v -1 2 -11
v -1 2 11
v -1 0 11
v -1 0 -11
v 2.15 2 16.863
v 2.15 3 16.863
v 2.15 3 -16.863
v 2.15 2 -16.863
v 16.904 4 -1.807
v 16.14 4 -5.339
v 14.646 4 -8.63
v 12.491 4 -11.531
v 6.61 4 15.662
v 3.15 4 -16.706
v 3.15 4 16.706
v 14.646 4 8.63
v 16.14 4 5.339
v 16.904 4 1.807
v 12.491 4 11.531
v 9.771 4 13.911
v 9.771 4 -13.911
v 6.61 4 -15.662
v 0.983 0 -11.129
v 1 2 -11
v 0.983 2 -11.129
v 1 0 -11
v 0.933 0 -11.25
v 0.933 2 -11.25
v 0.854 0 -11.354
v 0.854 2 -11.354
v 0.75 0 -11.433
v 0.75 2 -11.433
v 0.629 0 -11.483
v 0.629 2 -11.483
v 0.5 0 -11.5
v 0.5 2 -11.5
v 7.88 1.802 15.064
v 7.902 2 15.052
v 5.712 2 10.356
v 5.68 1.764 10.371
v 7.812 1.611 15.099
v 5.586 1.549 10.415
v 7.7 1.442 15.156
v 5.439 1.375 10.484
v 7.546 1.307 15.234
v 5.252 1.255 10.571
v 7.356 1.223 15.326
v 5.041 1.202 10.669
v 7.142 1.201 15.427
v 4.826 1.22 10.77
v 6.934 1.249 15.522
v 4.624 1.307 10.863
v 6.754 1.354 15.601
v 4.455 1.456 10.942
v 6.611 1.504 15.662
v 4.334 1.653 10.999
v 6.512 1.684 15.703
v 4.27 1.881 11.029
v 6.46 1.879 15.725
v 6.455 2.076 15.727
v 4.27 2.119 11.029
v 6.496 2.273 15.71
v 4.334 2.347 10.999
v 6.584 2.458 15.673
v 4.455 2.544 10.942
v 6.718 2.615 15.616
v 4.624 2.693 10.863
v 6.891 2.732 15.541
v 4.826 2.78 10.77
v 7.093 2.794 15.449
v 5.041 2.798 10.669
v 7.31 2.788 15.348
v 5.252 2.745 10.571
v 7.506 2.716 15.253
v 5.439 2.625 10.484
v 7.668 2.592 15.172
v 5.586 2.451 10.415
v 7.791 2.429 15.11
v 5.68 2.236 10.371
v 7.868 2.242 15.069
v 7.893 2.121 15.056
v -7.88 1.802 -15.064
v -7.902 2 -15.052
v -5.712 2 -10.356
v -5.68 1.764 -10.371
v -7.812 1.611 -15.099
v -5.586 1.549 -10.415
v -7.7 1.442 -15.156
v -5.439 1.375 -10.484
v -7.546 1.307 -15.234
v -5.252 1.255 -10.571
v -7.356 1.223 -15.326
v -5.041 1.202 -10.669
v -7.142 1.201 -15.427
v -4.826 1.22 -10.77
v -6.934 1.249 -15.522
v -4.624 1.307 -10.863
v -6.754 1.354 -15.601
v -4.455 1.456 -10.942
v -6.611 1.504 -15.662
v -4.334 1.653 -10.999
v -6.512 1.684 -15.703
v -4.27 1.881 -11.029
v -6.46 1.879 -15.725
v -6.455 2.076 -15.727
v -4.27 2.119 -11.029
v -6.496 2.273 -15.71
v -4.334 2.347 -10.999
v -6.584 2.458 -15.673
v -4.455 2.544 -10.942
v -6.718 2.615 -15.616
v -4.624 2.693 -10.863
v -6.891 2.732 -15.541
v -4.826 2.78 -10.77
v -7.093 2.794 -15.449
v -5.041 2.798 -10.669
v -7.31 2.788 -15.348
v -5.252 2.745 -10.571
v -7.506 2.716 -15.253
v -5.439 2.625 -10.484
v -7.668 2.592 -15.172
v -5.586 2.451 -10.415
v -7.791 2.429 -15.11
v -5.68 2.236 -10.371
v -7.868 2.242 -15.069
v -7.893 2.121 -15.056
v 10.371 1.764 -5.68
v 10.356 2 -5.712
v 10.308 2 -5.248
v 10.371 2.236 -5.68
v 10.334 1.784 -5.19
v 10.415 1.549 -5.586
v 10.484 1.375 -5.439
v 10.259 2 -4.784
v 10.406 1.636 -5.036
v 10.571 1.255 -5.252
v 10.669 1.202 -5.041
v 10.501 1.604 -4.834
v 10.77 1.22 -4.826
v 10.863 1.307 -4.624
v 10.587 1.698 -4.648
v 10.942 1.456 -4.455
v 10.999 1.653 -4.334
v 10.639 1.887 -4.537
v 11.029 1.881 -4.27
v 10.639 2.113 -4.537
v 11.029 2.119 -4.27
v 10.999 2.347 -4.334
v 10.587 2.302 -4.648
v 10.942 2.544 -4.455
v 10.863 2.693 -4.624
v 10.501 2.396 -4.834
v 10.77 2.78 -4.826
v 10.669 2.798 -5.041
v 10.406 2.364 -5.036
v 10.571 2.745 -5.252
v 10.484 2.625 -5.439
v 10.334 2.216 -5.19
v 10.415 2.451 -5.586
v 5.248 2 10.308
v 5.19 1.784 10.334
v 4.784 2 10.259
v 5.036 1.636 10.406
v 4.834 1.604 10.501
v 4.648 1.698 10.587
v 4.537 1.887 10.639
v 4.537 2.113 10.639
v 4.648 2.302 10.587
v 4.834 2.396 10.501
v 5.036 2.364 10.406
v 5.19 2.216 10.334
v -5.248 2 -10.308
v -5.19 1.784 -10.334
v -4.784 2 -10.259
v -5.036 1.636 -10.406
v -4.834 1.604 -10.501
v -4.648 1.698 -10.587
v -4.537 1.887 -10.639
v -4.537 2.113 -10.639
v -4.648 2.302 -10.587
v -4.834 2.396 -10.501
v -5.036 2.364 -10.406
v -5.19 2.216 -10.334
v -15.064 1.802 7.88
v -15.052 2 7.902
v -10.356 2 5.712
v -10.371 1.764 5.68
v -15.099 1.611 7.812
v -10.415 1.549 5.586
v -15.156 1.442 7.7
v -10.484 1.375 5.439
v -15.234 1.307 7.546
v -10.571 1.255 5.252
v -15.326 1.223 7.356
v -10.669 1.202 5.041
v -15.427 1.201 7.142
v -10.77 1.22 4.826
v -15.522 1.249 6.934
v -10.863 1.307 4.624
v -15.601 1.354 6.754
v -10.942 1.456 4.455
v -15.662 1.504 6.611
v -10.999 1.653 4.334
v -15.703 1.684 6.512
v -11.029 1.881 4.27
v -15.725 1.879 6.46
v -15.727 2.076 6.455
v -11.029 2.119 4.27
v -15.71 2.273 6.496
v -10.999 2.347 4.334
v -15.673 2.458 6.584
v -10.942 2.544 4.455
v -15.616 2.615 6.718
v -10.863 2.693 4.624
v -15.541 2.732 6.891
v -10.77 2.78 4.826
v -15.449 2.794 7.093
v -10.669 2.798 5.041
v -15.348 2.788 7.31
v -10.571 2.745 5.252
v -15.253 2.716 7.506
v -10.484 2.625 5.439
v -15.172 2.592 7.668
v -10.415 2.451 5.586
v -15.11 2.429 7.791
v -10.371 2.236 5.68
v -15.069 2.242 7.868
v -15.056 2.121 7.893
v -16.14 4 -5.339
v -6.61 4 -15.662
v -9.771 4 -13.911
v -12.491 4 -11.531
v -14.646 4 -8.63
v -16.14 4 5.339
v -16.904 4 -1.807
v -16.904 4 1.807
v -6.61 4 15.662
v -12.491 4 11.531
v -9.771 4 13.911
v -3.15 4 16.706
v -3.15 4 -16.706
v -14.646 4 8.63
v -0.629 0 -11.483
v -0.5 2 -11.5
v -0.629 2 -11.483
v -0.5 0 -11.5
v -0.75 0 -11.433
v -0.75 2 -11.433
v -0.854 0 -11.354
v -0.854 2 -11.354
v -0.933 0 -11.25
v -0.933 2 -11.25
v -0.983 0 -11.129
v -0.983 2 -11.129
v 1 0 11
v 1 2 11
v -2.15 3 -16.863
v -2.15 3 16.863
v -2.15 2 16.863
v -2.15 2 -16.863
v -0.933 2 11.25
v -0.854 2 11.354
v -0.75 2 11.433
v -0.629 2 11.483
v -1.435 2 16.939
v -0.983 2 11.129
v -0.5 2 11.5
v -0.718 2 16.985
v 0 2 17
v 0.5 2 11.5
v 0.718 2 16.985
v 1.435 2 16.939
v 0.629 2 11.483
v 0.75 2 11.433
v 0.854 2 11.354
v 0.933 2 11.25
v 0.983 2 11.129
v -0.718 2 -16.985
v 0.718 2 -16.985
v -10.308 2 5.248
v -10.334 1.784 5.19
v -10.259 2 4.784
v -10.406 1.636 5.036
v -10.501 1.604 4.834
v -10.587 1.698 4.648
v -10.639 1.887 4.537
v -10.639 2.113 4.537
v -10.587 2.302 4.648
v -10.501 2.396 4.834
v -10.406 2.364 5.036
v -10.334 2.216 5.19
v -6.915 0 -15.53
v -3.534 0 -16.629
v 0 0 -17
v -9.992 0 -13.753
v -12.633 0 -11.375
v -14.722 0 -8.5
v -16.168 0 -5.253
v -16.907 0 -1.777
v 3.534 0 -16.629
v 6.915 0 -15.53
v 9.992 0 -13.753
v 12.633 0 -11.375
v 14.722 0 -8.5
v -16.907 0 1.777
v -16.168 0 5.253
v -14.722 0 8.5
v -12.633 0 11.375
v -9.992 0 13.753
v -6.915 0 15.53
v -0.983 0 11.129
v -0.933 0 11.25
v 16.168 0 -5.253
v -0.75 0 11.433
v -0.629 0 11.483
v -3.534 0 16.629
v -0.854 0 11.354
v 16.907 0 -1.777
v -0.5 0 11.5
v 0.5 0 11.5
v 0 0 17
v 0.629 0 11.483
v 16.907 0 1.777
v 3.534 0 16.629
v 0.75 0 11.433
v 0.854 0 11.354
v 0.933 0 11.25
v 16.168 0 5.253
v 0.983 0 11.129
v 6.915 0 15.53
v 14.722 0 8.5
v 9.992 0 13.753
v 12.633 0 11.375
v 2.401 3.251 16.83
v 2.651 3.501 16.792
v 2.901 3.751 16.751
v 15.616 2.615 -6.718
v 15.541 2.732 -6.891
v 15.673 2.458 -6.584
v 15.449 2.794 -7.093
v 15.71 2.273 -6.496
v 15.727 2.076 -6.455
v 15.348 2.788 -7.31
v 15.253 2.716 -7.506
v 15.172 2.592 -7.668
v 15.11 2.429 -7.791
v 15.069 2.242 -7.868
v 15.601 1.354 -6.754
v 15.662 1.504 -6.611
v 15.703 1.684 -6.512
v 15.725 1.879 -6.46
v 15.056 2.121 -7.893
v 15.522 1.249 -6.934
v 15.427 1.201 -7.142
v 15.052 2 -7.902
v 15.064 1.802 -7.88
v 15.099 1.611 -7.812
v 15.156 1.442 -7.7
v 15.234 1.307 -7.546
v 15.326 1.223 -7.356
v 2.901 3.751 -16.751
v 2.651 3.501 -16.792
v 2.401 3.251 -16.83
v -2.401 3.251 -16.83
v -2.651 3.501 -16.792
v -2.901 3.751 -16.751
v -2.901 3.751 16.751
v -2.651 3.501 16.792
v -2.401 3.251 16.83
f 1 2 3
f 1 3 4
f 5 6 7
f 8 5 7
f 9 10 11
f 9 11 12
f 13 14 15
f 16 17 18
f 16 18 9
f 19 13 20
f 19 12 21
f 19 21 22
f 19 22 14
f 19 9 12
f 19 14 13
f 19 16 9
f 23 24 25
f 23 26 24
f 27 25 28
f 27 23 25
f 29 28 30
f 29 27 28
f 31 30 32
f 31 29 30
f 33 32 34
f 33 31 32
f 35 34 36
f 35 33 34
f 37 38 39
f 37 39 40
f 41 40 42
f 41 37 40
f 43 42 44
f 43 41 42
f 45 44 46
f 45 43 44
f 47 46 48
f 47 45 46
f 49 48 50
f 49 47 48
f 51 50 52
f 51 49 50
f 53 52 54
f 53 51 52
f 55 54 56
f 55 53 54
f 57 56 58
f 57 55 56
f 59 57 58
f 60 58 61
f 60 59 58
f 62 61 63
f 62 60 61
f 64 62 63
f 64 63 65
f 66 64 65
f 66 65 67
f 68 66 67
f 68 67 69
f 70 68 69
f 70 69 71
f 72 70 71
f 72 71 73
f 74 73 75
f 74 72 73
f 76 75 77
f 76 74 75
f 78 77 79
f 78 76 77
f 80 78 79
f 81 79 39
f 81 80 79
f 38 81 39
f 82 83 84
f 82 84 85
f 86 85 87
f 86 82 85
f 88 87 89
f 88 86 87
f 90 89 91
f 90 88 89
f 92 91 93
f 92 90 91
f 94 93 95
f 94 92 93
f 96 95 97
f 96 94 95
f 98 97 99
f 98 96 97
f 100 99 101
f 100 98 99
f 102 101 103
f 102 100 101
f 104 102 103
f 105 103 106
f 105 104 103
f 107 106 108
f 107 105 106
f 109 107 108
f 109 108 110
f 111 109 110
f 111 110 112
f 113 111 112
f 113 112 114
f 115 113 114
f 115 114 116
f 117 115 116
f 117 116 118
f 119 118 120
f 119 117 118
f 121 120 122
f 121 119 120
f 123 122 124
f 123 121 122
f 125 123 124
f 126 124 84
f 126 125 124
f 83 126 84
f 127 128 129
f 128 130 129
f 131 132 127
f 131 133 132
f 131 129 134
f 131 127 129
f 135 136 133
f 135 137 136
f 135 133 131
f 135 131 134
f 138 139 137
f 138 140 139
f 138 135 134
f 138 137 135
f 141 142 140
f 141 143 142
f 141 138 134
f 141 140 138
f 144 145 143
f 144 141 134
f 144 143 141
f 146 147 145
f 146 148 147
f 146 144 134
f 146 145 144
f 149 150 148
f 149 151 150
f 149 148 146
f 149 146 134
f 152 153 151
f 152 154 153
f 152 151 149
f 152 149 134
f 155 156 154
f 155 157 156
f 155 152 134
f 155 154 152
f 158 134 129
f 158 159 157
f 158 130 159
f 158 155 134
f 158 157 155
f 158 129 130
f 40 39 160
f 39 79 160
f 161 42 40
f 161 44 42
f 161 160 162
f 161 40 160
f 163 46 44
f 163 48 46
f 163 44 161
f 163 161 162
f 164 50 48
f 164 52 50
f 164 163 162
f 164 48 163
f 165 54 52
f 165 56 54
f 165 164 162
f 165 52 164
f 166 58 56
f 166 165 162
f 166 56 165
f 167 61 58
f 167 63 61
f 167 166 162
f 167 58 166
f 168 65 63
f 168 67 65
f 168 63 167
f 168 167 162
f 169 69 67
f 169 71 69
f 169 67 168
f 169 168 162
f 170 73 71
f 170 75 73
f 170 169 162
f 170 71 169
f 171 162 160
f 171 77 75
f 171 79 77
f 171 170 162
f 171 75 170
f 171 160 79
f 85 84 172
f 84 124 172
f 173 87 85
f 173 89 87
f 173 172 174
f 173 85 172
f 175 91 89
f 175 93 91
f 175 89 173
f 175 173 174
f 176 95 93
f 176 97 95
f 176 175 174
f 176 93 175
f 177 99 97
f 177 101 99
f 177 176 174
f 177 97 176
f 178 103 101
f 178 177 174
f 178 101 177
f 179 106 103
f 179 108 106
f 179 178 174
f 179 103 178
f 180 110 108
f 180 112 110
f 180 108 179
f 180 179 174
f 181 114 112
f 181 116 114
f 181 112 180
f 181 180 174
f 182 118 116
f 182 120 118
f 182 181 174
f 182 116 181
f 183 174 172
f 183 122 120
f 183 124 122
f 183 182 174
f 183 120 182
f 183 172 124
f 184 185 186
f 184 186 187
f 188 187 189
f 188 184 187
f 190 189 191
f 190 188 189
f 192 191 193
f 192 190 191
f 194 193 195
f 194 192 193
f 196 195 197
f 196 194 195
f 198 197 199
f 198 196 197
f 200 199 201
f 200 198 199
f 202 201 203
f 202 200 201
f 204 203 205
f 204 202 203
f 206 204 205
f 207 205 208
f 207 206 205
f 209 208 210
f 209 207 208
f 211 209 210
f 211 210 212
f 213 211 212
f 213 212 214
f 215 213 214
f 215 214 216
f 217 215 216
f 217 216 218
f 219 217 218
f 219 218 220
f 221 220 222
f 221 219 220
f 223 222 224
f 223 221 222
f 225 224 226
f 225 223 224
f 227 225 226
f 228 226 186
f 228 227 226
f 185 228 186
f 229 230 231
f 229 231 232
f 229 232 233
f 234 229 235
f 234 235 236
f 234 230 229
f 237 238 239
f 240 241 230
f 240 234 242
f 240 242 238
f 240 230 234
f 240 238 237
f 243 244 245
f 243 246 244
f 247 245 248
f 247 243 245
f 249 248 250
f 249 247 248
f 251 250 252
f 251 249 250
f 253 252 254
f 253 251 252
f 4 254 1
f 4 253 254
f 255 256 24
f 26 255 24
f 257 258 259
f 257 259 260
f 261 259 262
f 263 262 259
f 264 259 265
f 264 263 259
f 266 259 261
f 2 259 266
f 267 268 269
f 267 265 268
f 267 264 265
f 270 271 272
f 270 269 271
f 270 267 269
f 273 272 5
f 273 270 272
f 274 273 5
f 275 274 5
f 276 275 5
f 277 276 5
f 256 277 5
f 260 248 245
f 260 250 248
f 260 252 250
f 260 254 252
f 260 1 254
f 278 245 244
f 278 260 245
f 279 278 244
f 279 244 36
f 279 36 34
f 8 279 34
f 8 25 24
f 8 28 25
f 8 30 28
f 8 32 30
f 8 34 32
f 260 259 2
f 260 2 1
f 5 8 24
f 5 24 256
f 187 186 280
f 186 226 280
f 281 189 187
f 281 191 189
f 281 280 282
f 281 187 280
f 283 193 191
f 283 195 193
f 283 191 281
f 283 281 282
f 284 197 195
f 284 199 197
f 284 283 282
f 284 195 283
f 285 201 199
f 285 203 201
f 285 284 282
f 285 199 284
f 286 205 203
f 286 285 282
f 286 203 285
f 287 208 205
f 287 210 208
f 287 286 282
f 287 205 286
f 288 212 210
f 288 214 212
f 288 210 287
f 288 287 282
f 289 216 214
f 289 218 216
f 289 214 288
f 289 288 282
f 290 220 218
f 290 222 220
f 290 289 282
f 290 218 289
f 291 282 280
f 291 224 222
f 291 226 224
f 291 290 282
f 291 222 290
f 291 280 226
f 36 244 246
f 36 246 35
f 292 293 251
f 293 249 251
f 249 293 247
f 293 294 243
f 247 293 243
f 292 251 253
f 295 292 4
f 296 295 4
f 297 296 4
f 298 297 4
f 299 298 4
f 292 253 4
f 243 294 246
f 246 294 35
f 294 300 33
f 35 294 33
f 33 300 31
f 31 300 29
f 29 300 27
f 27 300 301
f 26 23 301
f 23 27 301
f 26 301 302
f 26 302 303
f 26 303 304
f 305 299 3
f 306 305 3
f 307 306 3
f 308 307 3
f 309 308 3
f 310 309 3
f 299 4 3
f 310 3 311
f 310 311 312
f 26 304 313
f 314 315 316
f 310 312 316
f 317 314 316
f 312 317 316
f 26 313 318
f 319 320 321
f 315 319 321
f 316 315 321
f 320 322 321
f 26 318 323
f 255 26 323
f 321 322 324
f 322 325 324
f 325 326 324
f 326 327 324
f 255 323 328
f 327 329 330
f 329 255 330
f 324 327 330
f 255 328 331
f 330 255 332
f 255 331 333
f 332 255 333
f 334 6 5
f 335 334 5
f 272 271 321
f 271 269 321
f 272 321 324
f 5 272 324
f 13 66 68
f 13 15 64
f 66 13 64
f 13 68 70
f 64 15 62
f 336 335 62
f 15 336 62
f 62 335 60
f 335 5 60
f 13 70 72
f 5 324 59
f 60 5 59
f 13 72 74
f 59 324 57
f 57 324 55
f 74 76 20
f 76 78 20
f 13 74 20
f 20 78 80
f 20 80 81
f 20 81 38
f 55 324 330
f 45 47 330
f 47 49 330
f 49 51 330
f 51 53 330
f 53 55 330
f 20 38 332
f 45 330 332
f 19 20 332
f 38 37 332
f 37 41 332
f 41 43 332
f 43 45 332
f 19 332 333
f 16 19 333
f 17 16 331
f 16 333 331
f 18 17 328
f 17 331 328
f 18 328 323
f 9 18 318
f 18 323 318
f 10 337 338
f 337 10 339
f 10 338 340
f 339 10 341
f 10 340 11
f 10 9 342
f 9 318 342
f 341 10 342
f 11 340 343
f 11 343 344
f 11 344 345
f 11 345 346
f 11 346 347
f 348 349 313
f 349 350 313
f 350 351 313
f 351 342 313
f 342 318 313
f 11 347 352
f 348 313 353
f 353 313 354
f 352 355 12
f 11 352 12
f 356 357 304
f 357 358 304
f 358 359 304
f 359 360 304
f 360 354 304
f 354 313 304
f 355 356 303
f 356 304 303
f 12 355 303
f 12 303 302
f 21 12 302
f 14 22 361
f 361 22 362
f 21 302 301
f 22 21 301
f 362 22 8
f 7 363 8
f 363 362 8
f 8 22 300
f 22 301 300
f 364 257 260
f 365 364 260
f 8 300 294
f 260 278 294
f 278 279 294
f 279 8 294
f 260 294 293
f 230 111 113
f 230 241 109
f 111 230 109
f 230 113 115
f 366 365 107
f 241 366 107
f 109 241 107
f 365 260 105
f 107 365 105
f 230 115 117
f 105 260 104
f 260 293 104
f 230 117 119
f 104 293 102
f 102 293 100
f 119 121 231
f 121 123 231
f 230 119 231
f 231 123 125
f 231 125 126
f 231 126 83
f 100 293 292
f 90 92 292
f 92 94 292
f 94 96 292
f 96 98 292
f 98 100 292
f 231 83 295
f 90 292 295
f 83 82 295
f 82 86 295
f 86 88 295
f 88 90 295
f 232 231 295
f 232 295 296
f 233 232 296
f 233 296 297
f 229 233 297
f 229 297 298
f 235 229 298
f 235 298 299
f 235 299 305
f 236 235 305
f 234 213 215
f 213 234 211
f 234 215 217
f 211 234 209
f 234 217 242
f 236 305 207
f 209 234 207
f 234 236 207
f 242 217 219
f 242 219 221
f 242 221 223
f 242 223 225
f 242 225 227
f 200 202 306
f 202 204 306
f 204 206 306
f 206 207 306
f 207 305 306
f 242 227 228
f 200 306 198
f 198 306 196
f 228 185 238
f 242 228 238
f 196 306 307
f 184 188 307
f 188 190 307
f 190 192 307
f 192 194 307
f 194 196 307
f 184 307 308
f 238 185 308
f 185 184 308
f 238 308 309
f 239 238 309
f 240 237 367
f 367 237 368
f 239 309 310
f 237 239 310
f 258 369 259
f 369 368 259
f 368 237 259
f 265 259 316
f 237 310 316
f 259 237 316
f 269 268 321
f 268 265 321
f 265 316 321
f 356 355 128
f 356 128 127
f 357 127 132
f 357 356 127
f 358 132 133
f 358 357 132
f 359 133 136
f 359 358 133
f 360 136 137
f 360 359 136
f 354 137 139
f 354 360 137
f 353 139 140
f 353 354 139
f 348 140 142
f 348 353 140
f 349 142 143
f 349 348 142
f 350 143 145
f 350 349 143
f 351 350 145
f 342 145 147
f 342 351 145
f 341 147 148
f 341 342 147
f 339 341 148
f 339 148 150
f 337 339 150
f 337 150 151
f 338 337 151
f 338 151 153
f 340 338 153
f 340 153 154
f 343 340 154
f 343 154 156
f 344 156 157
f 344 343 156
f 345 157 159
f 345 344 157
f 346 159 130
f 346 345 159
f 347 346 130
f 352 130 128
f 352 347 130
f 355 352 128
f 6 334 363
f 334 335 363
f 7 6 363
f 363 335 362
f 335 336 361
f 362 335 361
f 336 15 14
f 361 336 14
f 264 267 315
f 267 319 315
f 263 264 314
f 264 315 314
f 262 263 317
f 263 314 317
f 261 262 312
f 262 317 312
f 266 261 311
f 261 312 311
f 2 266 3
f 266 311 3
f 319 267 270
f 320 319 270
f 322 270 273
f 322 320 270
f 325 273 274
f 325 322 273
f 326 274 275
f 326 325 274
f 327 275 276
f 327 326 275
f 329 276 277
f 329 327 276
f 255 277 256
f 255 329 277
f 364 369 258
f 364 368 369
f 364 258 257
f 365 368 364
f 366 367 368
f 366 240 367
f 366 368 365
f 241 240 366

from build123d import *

# Parameters (mm, degrees)
SKETCH1_R           = 17
BOSS_EXTRUDE1_DEPTH = 4
SKETCH23_W          = 4.3
SKETCH23_H          = 36
CUT_EXTRUDE5_DEPTH  = 2
SKETCH24_W          = 2
SKETCH24_H          = 23
CUT_EXTRUDE6_DEPTH  = 25.124676164
FILLET4_R           = 0.5
CHAMFER1_SIZE       = 1
CIRPATTERN1_COUNT   = 4


with BuildPart() as part:
    # Sketch1 → Boss-Extrude1 (new body)
    with BuildSketch(Plane(origin=(0, 0, 0), x_dir=(1, 0, 0), z_dir=(0, 1, 0))):
        with Locations(Location((0, 0, 0), (0, 0, 270))):
            Circle(SKETCH1_R)
    extrude(amount=BOSS_EXTRUDE1_DEPTH)

    # Sketch23 → Cut-Extrude5 (cut)
    with BuildSketch(Plane(origin=(0, 4, 0), x_dir=(1, 0, 0), z_dir=(0, 1, 0))):
        with Locations((0, -0.174485126)):
            Rectangle(SKETCH23_W, SKETCH23_H)
    extrude(amount=-CUT_EXTRUDE5_DEPTH, mode=Mode.SUBTRACT)

    # Sketch24 → Cut-Extrude6 (cut, through all)
    with BuildSketch(Plane(origin=(0, 2, 0), x_dir=(1, 0, 0), z_dir=(0, 1, 0))):
        Rectangle(SKETCH24_W, SKETCH24_H)
    extrude(amount=-CUT_EXTRUDE6_DEPTH, mode=Mode.SUBTRACT)

    # Fillet4
    fillet4_edges = [part.edges().sort_by_distance(p)[0] for p in [
        (1, 1, -11.5),
        (1, 1, 11.5),
        (-1, 1, 11.5),
        (-1, 1, -11.5),
    ]]
    fillet(fillet4_edges, radius=FILLET4_R)

    # Chamfer1
    chamfer1_edges = [part.edges().sort_by_distance(p)[0] for p in [
        (-2.15, 4, 0),
        (2.15, 4, 0),
    ]]
    chamfer(chamfer1_edges, length=CHAMFER1_SIZE)

    # Sketch27 → M2 Tapped Hole1 (revolve, cut)
    with BuildSketch(Plane(origin=(-7.18451045, 2, -15.40723238), x_dir=(-0.9063077870366497, 0, 0.4226182617407), z_dir=(0, 1, 0))):
        Polygon((0, 0), (0, 5.680688495), (0.8, 5.2), (0.8, 0), align=None)
    m2_tapped_hole1 = revolve(axis=Axis((-9.868136412, 2, -21.162286827), (0.42261826174069994, 0, 0.9063077870366498)), mode=Mode.SUBTRACT)

    # CirPattern1: M2 Tapped Hole1 ×4 about axis
    cirpattern1_axis = Axis((0, 0, 0), (0, -1, 0))
    for i in range(1, CIRPATTERN1_COUNT):
        add(m2_tapped_hole1.rotate(cirpattern1_axis, i * 360 / CIRPATTERN1_COUNT), mode=Mode.SUBTRACT)


solid = part.part
